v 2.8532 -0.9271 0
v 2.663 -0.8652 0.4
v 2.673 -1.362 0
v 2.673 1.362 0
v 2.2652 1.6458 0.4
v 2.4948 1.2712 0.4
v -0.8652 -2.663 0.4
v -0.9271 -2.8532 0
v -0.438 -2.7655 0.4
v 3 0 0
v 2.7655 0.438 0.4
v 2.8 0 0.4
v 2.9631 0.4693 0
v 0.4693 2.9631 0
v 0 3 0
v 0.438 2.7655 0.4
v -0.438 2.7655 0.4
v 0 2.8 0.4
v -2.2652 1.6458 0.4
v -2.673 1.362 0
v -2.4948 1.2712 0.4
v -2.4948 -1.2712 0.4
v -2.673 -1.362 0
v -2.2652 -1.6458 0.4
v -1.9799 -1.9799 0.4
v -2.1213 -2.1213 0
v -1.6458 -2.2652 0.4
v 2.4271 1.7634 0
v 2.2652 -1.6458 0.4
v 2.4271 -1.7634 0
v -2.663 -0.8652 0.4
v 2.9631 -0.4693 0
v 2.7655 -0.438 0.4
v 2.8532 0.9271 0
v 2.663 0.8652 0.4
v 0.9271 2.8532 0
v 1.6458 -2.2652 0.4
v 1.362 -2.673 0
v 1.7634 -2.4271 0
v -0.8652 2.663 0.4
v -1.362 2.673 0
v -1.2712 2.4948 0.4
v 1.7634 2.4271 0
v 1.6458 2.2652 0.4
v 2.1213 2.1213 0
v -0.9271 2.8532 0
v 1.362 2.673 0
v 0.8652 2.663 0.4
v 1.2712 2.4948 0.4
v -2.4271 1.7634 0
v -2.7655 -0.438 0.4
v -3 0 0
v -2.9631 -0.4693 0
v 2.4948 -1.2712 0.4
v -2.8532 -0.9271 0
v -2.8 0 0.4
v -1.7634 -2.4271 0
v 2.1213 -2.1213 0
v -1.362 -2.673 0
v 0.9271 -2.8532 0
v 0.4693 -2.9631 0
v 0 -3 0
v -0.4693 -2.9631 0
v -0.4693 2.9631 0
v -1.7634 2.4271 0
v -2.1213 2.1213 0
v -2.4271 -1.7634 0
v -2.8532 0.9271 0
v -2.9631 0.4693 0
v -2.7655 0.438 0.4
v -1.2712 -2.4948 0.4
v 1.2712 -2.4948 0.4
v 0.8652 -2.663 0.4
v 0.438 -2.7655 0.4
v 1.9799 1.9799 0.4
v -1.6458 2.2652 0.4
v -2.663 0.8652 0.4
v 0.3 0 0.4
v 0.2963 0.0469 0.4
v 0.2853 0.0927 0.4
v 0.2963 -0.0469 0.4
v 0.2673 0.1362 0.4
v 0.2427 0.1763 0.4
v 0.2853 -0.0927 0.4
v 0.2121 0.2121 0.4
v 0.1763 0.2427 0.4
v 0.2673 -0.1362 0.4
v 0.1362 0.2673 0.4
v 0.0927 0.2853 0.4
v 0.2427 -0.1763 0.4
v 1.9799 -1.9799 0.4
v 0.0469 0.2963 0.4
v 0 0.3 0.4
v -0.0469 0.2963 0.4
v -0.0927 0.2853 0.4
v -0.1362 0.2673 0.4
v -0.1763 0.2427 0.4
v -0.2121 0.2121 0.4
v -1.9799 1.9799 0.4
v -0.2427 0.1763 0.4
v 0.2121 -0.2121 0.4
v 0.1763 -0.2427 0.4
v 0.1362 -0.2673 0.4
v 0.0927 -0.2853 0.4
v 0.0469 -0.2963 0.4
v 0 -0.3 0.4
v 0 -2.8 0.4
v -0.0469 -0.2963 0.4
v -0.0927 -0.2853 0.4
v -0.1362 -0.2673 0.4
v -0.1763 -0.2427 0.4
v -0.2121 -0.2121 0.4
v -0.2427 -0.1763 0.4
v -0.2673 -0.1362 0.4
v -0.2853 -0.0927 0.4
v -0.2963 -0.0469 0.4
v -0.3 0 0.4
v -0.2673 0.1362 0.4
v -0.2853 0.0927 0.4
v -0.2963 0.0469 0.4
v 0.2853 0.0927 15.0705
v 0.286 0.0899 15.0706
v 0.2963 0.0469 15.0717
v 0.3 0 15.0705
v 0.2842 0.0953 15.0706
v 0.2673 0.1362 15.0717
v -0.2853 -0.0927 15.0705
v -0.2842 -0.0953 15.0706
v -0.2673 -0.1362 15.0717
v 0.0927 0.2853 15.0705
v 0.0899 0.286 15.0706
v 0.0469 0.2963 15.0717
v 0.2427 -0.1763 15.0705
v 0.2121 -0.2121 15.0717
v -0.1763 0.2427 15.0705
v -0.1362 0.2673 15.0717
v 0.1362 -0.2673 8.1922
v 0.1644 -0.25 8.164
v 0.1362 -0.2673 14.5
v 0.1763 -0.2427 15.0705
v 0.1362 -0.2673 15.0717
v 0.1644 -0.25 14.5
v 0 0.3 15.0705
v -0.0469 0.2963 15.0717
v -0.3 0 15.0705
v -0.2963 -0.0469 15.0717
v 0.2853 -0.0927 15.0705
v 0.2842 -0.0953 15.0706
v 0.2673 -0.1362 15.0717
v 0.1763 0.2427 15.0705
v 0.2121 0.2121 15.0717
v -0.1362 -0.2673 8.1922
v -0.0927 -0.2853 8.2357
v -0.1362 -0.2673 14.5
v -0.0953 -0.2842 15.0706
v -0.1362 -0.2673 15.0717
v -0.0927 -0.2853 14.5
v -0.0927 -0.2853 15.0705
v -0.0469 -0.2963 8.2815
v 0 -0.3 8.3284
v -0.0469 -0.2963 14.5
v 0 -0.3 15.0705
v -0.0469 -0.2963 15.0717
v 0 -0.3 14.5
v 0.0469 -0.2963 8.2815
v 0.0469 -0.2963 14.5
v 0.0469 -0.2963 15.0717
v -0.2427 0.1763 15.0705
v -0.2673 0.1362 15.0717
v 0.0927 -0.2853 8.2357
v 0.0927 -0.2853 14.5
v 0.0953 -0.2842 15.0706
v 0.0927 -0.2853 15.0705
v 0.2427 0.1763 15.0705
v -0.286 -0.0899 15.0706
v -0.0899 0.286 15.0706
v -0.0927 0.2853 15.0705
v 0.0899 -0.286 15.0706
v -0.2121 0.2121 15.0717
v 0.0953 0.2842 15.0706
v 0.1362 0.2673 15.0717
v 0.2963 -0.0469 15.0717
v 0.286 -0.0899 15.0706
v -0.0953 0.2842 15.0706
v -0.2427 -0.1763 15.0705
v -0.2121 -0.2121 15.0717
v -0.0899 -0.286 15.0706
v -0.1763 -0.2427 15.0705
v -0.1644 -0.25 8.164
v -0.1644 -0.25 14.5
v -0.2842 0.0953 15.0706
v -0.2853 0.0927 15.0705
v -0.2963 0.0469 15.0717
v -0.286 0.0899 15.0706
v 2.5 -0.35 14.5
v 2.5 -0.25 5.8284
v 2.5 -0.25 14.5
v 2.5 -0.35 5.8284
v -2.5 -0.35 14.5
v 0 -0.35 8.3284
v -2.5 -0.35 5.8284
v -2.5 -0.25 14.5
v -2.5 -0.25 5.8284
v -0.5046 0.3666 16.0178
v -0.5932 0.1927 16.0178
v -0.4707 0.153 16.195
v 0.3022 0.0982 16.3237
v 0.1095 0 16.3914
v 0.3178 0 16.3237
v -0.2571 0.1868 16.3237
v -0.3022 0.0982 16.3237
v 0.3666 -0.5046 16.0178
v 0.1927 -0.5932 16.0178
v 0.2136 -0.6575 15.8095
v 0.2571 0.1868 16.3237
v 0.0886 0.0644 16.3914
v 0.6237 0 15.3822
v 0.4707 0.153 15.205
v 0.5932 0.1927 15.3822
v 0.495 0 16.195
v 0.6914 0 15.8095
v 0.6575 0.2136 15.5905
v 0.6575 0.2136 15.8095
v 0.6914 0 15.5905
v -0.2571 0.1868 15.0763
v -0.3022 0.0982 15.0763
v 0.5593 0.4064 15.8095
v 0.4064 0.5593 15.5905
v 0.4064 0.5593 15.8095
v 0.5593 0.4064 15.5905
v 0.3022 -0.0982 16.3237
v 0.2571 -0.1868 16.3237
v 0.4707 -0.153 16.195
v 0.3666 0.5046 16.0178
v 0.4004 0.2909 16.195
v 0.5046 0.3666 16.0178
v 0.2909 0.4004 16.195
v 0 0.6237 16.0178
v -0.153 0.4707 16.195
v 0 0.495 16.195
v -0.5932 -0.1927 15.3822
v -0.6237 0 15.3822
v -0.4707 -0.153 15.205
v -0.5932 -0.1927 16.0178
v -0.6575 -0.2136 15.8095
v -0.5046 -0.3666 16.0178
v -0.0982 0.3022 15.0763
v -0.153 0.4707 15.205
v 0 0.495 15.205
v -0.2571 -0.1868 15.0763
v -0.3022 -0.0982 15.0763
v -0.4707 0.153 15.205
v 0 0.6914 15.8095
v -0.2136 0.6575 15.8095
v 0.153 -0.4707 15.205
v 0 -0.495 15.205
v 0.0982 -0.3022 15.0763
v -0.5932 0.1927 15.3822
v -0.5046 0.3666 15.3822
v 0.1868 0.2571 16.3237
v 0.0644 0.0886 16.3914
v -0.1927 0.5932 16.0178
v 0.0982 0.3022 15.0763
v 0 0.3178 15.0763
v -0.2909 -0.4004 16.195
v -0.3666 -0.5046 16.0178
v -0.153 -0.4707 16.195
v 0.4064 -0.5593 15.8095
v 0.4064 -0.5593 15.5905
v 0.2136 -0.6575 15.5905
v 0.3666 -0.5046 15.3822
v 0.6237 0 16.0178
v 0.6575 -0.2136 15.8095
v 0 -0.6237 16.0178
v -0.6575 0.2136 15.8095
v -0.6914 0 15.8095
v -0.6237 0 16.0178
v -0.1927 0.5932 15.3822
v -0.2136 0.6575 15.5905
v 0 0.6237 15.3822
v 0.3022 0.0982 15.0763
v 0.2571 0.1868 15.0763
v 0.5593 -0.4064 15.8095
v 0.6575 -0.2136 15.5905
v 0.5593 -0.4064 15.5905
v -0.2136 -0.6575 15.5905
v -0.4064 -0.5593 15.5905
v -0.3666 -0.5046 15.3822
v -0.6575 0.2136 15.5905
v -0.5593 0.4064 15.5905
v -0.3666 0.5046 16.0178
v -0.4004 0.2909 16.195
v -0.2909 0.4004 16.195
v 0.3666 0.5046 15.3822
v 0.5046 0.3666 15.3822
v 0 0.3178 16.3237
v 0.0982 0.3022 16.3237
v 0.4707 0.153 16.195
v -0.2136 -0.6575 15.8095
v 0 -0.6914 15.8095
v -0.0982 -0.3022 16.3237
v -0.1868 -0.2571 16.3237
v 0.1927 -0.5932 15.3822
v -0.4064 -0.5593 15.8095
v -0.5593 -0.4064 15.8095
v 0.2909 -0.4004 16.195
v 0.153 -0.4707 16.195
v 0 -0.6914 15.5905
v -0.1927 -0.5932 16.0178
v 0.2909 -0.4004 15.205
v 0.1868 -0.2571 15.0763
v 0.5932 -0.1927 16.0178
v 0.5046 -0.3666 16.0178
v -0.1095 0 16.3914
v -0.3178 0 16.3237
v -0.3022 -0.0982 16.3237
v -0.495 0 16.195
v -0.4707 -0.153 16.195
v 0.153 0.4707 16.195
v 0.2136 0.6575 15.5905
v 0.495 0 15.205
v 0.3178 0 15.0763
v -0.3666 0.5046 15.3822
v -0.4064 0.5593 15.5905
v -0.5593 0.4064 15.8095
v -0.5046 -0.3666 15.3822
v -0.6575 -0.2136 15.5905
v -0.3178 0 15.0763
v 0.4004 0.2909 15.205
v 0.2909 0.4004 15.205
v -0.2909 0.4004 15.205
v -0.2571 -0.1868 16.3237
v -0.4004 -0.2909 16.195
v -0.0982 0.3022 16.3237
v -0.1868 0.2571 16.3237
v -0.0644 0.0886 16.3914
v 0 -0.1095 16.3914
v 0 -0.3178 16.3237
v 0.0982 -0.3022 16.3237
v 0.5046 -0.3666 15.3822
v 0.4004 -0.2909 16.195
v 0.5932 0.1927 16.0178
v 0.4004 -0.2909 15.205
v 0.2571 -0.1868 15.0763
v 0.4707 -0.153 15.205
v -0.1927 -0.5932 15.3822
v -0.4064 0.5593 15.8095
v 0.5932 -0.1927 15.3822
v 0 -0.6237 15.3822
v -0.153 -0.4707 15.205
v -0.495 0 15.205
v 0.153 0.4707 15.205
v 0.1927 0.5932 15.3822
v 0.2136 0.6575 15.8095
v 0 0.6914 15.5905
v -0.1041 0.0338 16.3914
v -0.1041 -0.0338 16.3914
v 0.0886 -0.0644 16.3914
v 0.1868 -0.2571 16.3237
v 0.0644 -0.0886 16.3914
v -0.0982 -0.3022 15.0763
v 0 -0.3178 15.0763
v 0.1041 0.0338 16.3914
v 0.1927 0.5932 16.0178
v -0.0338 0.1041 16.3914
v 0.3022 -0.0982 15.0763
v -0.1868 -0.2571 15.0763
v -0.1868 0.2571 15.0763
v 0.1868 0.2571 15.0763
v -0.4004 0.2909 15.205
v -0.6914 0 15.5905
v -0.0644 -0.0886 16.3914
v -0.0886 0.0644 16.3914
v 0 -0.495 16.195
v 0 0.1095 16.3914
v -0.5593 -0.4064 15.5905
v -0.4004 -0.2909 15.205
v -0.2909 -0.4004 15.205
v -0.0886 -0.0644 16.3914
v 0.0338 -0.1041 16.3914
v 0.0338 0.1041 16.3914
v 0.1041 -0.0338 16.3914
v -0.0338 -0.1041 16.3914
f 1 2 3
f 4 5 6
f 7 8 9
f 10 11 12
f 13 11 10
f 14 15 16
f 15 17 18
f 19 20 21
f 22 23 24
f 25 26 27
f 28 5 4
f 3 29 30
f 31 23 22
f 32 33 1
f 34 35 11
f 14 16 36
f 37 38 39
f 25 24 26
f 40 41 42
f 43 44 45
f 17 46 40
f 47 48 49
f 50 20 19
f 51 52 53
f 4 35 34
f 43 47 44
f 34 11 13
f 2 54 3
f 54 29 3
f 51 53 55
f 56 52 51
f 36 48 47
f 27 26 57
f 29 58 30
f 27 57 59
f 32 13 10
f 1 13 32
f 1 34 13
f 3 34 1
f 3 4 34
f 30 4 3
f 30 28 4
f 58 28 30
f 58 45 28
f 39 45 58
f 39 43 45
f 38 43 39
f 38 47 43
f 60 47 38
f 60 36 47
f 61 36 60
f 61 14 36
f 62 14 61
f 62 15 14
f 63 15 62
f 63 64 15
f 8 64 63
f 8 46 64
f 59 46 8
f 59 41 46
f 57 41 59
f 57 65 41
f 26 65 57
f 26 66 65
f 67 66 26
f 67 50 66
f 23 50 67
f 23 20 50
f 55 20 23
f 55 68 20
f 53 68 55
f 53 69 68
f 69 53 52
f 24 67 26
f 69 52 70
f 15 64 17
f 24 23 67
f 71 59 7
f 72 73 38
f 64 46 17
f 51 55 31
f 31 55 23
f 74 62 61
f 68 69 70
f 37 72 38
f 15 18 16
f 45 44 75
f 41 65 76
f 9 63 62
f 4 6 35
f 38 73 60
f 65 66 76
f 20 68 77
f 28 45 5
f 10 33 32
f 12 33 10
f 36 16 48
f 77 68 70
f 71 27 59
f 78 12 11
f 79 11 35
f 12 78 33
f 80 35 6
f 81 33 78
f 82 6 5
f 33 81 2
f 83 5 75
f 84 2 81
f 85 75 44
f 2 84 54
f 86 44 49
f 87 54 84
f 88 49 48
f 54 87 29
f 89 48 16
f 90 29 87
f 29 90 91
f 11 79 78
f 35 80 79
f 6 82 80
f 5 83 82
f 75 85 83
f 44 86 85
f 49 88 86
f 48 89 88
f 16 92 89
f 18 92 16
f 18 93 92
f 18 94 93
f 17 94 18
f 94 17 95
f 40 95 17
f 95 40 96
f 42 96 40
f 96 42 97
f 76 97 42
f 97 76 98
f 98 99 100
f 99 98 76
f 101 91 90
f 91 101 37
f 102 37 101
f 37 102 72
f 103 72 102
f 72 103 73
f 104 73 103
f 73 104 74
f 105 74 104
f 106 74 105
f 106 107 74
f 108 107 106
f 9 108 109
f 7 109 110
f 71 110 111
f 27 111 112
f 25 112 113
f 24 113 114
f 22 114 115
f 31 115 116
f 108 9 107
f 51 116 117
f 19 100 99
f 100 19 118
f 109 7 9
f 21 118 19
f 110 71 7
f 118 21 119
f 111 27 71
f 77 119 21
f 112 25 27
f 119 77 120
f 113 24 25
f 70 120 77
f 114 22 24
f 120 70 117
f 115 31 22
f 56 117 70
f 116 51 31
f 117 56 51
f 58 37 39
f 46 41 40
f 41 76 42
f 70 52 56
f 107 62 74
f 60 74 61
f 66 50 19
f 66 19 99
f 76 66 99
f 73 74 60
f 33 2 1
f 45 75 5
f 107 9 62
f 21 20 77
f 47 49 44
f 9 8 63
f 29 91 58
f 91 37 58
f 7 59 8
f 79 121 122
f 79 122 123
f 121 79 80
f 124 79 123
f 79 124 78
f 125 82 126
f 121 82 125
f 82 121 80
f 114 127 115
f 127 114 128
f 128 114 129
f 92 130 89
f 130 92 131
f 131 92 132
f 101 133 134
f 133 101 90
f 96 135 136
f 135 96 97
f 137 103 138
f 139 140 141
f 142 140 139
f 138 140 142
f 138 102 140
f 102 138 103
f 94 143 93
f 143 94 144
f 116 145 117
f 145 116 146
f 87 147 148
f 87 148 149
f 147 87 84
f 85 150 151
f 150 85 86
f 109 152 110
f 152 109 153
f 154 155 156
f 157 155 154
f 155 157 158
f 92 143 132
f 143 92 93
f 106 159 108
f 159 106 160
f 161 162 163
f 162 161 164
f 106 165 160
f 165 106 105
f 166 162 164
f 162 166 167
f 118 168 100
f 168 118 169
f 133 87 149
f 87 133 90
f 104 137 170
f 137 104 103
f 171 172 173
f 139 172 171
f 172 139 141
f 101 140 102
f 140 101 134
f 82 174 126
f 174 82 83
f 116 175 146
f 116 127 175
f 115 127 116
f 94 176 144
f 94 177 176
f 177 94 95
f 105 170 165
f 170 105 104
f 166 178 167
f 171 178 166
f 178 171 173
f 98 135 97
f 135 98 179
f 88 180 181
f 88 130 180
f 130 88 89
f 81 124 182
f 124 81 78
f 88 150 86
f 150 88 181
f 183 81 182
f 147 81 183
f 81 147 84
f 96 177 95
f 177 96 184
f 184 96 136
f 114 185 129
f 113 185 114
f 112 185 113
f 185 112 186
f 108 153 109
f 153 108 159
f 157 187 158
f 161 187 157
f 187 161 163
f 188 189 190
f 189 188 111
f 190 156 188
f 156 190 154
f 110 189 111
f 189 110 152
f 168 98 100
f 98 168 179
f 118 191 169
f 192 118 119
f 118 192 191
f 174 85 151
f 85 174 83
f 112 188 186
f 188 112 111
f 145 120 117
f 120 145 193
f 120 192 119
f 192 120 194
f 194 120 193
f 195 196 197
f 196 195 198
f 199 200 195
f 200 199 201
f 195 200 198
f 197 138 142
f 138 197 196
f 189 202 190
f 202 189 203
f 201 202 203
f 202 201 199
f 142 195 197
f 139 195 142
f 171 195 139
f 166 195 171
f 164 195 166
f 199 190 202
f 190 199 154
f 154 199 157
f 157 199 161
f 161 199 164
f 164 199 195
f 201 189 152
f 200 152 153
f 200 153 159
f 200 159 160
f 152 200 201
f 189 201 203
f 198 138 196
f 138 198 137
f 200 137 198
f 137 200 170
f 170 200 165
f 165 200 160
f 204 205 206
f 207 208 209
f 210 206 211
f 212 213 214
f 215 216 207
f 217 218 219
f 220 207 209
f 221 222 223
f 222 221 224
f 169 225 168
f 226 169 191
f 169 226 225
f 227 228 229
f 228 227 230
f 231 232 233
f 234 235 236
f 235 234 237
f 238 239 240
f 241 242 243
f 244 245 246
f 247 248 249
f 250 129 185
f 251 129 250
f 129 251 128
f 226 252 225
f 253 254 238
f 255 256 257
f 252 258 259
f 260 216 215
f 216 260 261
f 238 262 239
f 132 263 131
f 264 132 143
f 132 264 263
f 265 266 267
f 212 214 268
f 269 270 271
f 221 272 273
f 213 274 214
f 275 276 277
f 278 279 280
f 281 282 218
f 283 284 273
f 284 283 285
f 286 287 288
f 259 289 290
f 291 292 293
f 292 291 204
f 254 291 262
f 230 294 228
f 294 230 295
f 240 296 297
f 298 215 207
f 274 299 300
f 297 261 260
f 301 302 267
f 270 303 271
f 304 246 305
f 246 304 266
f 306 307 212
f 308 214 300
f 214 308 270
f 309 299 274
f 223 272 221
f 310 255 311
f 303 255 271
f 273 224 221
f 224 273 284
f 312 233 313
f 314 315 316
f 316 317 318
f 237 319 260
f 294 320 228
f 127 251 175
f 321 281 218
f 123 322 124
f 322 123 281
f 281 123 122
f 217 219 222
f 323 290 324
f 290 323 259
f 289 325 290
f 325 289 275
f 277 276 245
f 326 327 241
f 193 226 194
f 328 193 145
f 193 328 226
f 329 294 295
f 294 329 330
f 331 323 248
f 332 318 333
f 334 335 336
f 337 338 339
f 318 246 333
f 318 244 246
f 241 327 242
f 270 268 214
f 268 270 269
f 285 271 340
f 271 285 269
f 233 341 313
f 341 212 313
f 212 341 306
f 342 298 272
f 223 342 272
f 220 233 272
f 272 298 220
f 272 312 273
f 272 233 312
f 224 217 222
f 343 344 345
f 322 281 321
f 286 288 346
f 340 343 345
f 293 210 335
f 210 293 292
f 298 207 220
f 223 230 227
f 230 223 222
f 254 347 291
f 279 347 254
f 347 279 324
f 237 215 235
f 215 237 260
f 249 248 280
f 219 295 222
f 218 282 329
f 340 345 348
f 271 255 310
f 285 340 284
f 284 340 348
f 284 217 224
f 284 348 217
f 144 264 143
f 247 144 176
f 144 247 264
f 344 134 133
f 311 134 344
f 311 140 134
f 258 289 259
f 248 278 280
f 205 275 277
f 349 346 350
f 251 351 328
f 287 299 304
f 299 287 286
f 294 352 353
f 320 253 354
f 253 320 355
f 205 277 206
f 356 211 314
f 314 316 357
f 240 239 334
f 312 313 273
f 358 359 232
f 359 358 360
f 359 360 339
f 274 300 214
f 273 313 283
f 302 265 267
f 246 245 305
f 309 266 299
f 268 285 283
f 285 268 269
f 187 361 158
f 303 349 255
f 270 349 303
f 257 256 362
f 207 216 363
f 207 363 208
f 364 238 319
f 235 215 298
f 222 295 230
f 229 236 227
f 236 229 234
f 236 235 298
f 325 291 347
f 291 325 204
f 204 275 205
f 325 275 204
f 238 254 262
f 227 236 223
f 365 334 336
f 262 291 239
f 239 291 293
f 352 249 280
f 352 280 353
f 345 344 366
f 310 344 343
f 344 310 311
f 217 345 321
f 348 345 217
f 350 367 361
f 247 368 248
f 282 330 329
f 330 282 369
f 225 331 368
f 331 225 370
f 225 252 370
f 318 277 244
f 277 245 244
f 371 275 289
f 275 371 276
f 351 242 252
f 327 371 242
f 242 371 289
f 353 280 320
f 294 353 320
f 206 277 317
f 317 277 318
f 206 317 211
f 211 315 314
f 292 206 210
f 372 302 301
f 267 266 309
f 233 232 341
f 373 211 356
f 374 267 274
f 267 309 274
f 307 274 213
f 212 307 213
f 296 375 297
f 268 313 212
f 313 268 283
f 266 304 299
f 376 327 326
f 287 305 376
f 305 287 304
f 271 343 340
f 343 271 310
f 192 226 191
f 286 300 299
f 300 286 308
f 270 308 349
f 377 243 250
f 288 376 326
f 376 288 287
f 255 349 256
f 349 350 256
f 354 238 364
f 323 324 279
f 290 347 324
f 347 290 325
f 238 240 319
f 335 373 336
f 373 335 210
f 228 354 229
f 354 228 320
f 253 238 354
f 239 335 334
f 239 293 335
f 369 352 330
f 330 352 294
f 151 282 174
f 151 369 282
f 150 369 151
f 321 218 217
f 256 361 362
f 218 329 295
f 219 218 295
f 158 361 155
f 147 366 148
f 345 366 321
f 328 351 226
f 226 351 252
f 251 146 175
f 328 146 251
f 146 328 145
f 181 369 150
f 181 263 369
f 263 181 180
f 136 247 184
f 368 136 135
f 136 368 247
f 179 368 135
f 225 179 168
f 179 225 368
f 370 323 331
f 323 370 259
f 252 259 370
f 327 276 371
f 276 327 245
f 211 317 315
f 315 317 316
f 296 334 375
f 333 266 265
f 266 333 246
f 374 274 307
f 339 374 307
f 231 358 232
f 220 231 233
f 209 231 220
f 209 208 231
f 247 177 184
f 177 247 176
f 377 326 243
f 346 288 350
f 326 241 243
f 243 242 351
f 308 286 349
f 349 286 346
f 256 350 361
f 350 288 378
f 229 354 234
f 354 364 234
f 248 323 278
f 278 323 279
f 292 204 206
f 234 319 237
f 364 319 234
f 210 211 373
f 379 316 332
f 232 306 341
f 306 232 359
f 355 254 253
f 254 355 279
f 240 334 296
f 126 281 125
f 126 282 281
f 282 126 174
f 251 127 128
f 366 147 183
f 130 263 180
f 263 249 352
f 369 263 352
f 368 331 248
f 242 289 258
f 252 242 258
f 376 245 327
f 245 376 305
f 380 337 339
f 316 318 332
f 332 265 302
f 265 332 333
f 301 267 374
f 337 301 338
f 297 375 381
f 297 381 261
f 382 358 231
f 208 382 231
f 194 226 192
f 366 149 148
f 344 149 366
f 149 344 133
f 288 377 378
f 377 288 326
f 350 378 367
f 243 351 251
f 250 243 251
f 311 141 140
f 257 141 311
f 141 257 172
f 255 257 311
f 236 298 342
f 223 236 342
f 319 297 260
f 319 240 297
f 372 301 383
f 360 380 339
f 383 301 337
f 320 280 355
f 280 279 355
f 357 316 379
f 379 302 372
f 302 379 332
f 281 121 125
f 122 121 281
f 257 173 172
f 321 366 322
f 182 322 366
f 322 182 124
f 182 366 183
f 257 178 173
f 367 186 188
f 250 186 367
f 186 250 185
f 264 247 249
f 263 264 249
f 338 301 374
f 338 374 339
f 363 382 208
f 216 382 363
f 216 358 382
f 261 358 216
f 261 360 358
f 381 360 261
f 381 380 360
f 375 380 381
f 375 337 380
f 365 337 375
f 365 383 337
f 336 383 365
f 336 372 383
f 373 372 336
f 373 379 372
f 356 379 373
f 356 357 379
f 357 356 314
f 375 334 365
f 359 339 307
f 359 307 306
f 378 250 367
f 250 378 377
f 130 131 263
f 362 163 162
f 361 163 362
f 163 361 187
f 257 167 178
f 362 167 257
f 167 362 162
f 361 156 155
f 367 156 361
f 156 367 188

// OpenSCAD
module banner(){

color("gray"){
cylinder(0.4,3,2.8, $fn =40);

translate([0,0,0.3])
cylinder(15,0.3,0.3, $fn = 40);

}

color("gray")

translate([0,0,15.7], $fn = 20)
sphere(r =0.7);


translate([0.0,-0.3,10])

rotate([90,0,0]){

difference(){
color("green")
cube([5,9,0.1], center=true );


translate([0,-4.5,0])
rotate([0,0,45]){

cube([4,4,0.9], center=true );
}
}
}
}

banner();
